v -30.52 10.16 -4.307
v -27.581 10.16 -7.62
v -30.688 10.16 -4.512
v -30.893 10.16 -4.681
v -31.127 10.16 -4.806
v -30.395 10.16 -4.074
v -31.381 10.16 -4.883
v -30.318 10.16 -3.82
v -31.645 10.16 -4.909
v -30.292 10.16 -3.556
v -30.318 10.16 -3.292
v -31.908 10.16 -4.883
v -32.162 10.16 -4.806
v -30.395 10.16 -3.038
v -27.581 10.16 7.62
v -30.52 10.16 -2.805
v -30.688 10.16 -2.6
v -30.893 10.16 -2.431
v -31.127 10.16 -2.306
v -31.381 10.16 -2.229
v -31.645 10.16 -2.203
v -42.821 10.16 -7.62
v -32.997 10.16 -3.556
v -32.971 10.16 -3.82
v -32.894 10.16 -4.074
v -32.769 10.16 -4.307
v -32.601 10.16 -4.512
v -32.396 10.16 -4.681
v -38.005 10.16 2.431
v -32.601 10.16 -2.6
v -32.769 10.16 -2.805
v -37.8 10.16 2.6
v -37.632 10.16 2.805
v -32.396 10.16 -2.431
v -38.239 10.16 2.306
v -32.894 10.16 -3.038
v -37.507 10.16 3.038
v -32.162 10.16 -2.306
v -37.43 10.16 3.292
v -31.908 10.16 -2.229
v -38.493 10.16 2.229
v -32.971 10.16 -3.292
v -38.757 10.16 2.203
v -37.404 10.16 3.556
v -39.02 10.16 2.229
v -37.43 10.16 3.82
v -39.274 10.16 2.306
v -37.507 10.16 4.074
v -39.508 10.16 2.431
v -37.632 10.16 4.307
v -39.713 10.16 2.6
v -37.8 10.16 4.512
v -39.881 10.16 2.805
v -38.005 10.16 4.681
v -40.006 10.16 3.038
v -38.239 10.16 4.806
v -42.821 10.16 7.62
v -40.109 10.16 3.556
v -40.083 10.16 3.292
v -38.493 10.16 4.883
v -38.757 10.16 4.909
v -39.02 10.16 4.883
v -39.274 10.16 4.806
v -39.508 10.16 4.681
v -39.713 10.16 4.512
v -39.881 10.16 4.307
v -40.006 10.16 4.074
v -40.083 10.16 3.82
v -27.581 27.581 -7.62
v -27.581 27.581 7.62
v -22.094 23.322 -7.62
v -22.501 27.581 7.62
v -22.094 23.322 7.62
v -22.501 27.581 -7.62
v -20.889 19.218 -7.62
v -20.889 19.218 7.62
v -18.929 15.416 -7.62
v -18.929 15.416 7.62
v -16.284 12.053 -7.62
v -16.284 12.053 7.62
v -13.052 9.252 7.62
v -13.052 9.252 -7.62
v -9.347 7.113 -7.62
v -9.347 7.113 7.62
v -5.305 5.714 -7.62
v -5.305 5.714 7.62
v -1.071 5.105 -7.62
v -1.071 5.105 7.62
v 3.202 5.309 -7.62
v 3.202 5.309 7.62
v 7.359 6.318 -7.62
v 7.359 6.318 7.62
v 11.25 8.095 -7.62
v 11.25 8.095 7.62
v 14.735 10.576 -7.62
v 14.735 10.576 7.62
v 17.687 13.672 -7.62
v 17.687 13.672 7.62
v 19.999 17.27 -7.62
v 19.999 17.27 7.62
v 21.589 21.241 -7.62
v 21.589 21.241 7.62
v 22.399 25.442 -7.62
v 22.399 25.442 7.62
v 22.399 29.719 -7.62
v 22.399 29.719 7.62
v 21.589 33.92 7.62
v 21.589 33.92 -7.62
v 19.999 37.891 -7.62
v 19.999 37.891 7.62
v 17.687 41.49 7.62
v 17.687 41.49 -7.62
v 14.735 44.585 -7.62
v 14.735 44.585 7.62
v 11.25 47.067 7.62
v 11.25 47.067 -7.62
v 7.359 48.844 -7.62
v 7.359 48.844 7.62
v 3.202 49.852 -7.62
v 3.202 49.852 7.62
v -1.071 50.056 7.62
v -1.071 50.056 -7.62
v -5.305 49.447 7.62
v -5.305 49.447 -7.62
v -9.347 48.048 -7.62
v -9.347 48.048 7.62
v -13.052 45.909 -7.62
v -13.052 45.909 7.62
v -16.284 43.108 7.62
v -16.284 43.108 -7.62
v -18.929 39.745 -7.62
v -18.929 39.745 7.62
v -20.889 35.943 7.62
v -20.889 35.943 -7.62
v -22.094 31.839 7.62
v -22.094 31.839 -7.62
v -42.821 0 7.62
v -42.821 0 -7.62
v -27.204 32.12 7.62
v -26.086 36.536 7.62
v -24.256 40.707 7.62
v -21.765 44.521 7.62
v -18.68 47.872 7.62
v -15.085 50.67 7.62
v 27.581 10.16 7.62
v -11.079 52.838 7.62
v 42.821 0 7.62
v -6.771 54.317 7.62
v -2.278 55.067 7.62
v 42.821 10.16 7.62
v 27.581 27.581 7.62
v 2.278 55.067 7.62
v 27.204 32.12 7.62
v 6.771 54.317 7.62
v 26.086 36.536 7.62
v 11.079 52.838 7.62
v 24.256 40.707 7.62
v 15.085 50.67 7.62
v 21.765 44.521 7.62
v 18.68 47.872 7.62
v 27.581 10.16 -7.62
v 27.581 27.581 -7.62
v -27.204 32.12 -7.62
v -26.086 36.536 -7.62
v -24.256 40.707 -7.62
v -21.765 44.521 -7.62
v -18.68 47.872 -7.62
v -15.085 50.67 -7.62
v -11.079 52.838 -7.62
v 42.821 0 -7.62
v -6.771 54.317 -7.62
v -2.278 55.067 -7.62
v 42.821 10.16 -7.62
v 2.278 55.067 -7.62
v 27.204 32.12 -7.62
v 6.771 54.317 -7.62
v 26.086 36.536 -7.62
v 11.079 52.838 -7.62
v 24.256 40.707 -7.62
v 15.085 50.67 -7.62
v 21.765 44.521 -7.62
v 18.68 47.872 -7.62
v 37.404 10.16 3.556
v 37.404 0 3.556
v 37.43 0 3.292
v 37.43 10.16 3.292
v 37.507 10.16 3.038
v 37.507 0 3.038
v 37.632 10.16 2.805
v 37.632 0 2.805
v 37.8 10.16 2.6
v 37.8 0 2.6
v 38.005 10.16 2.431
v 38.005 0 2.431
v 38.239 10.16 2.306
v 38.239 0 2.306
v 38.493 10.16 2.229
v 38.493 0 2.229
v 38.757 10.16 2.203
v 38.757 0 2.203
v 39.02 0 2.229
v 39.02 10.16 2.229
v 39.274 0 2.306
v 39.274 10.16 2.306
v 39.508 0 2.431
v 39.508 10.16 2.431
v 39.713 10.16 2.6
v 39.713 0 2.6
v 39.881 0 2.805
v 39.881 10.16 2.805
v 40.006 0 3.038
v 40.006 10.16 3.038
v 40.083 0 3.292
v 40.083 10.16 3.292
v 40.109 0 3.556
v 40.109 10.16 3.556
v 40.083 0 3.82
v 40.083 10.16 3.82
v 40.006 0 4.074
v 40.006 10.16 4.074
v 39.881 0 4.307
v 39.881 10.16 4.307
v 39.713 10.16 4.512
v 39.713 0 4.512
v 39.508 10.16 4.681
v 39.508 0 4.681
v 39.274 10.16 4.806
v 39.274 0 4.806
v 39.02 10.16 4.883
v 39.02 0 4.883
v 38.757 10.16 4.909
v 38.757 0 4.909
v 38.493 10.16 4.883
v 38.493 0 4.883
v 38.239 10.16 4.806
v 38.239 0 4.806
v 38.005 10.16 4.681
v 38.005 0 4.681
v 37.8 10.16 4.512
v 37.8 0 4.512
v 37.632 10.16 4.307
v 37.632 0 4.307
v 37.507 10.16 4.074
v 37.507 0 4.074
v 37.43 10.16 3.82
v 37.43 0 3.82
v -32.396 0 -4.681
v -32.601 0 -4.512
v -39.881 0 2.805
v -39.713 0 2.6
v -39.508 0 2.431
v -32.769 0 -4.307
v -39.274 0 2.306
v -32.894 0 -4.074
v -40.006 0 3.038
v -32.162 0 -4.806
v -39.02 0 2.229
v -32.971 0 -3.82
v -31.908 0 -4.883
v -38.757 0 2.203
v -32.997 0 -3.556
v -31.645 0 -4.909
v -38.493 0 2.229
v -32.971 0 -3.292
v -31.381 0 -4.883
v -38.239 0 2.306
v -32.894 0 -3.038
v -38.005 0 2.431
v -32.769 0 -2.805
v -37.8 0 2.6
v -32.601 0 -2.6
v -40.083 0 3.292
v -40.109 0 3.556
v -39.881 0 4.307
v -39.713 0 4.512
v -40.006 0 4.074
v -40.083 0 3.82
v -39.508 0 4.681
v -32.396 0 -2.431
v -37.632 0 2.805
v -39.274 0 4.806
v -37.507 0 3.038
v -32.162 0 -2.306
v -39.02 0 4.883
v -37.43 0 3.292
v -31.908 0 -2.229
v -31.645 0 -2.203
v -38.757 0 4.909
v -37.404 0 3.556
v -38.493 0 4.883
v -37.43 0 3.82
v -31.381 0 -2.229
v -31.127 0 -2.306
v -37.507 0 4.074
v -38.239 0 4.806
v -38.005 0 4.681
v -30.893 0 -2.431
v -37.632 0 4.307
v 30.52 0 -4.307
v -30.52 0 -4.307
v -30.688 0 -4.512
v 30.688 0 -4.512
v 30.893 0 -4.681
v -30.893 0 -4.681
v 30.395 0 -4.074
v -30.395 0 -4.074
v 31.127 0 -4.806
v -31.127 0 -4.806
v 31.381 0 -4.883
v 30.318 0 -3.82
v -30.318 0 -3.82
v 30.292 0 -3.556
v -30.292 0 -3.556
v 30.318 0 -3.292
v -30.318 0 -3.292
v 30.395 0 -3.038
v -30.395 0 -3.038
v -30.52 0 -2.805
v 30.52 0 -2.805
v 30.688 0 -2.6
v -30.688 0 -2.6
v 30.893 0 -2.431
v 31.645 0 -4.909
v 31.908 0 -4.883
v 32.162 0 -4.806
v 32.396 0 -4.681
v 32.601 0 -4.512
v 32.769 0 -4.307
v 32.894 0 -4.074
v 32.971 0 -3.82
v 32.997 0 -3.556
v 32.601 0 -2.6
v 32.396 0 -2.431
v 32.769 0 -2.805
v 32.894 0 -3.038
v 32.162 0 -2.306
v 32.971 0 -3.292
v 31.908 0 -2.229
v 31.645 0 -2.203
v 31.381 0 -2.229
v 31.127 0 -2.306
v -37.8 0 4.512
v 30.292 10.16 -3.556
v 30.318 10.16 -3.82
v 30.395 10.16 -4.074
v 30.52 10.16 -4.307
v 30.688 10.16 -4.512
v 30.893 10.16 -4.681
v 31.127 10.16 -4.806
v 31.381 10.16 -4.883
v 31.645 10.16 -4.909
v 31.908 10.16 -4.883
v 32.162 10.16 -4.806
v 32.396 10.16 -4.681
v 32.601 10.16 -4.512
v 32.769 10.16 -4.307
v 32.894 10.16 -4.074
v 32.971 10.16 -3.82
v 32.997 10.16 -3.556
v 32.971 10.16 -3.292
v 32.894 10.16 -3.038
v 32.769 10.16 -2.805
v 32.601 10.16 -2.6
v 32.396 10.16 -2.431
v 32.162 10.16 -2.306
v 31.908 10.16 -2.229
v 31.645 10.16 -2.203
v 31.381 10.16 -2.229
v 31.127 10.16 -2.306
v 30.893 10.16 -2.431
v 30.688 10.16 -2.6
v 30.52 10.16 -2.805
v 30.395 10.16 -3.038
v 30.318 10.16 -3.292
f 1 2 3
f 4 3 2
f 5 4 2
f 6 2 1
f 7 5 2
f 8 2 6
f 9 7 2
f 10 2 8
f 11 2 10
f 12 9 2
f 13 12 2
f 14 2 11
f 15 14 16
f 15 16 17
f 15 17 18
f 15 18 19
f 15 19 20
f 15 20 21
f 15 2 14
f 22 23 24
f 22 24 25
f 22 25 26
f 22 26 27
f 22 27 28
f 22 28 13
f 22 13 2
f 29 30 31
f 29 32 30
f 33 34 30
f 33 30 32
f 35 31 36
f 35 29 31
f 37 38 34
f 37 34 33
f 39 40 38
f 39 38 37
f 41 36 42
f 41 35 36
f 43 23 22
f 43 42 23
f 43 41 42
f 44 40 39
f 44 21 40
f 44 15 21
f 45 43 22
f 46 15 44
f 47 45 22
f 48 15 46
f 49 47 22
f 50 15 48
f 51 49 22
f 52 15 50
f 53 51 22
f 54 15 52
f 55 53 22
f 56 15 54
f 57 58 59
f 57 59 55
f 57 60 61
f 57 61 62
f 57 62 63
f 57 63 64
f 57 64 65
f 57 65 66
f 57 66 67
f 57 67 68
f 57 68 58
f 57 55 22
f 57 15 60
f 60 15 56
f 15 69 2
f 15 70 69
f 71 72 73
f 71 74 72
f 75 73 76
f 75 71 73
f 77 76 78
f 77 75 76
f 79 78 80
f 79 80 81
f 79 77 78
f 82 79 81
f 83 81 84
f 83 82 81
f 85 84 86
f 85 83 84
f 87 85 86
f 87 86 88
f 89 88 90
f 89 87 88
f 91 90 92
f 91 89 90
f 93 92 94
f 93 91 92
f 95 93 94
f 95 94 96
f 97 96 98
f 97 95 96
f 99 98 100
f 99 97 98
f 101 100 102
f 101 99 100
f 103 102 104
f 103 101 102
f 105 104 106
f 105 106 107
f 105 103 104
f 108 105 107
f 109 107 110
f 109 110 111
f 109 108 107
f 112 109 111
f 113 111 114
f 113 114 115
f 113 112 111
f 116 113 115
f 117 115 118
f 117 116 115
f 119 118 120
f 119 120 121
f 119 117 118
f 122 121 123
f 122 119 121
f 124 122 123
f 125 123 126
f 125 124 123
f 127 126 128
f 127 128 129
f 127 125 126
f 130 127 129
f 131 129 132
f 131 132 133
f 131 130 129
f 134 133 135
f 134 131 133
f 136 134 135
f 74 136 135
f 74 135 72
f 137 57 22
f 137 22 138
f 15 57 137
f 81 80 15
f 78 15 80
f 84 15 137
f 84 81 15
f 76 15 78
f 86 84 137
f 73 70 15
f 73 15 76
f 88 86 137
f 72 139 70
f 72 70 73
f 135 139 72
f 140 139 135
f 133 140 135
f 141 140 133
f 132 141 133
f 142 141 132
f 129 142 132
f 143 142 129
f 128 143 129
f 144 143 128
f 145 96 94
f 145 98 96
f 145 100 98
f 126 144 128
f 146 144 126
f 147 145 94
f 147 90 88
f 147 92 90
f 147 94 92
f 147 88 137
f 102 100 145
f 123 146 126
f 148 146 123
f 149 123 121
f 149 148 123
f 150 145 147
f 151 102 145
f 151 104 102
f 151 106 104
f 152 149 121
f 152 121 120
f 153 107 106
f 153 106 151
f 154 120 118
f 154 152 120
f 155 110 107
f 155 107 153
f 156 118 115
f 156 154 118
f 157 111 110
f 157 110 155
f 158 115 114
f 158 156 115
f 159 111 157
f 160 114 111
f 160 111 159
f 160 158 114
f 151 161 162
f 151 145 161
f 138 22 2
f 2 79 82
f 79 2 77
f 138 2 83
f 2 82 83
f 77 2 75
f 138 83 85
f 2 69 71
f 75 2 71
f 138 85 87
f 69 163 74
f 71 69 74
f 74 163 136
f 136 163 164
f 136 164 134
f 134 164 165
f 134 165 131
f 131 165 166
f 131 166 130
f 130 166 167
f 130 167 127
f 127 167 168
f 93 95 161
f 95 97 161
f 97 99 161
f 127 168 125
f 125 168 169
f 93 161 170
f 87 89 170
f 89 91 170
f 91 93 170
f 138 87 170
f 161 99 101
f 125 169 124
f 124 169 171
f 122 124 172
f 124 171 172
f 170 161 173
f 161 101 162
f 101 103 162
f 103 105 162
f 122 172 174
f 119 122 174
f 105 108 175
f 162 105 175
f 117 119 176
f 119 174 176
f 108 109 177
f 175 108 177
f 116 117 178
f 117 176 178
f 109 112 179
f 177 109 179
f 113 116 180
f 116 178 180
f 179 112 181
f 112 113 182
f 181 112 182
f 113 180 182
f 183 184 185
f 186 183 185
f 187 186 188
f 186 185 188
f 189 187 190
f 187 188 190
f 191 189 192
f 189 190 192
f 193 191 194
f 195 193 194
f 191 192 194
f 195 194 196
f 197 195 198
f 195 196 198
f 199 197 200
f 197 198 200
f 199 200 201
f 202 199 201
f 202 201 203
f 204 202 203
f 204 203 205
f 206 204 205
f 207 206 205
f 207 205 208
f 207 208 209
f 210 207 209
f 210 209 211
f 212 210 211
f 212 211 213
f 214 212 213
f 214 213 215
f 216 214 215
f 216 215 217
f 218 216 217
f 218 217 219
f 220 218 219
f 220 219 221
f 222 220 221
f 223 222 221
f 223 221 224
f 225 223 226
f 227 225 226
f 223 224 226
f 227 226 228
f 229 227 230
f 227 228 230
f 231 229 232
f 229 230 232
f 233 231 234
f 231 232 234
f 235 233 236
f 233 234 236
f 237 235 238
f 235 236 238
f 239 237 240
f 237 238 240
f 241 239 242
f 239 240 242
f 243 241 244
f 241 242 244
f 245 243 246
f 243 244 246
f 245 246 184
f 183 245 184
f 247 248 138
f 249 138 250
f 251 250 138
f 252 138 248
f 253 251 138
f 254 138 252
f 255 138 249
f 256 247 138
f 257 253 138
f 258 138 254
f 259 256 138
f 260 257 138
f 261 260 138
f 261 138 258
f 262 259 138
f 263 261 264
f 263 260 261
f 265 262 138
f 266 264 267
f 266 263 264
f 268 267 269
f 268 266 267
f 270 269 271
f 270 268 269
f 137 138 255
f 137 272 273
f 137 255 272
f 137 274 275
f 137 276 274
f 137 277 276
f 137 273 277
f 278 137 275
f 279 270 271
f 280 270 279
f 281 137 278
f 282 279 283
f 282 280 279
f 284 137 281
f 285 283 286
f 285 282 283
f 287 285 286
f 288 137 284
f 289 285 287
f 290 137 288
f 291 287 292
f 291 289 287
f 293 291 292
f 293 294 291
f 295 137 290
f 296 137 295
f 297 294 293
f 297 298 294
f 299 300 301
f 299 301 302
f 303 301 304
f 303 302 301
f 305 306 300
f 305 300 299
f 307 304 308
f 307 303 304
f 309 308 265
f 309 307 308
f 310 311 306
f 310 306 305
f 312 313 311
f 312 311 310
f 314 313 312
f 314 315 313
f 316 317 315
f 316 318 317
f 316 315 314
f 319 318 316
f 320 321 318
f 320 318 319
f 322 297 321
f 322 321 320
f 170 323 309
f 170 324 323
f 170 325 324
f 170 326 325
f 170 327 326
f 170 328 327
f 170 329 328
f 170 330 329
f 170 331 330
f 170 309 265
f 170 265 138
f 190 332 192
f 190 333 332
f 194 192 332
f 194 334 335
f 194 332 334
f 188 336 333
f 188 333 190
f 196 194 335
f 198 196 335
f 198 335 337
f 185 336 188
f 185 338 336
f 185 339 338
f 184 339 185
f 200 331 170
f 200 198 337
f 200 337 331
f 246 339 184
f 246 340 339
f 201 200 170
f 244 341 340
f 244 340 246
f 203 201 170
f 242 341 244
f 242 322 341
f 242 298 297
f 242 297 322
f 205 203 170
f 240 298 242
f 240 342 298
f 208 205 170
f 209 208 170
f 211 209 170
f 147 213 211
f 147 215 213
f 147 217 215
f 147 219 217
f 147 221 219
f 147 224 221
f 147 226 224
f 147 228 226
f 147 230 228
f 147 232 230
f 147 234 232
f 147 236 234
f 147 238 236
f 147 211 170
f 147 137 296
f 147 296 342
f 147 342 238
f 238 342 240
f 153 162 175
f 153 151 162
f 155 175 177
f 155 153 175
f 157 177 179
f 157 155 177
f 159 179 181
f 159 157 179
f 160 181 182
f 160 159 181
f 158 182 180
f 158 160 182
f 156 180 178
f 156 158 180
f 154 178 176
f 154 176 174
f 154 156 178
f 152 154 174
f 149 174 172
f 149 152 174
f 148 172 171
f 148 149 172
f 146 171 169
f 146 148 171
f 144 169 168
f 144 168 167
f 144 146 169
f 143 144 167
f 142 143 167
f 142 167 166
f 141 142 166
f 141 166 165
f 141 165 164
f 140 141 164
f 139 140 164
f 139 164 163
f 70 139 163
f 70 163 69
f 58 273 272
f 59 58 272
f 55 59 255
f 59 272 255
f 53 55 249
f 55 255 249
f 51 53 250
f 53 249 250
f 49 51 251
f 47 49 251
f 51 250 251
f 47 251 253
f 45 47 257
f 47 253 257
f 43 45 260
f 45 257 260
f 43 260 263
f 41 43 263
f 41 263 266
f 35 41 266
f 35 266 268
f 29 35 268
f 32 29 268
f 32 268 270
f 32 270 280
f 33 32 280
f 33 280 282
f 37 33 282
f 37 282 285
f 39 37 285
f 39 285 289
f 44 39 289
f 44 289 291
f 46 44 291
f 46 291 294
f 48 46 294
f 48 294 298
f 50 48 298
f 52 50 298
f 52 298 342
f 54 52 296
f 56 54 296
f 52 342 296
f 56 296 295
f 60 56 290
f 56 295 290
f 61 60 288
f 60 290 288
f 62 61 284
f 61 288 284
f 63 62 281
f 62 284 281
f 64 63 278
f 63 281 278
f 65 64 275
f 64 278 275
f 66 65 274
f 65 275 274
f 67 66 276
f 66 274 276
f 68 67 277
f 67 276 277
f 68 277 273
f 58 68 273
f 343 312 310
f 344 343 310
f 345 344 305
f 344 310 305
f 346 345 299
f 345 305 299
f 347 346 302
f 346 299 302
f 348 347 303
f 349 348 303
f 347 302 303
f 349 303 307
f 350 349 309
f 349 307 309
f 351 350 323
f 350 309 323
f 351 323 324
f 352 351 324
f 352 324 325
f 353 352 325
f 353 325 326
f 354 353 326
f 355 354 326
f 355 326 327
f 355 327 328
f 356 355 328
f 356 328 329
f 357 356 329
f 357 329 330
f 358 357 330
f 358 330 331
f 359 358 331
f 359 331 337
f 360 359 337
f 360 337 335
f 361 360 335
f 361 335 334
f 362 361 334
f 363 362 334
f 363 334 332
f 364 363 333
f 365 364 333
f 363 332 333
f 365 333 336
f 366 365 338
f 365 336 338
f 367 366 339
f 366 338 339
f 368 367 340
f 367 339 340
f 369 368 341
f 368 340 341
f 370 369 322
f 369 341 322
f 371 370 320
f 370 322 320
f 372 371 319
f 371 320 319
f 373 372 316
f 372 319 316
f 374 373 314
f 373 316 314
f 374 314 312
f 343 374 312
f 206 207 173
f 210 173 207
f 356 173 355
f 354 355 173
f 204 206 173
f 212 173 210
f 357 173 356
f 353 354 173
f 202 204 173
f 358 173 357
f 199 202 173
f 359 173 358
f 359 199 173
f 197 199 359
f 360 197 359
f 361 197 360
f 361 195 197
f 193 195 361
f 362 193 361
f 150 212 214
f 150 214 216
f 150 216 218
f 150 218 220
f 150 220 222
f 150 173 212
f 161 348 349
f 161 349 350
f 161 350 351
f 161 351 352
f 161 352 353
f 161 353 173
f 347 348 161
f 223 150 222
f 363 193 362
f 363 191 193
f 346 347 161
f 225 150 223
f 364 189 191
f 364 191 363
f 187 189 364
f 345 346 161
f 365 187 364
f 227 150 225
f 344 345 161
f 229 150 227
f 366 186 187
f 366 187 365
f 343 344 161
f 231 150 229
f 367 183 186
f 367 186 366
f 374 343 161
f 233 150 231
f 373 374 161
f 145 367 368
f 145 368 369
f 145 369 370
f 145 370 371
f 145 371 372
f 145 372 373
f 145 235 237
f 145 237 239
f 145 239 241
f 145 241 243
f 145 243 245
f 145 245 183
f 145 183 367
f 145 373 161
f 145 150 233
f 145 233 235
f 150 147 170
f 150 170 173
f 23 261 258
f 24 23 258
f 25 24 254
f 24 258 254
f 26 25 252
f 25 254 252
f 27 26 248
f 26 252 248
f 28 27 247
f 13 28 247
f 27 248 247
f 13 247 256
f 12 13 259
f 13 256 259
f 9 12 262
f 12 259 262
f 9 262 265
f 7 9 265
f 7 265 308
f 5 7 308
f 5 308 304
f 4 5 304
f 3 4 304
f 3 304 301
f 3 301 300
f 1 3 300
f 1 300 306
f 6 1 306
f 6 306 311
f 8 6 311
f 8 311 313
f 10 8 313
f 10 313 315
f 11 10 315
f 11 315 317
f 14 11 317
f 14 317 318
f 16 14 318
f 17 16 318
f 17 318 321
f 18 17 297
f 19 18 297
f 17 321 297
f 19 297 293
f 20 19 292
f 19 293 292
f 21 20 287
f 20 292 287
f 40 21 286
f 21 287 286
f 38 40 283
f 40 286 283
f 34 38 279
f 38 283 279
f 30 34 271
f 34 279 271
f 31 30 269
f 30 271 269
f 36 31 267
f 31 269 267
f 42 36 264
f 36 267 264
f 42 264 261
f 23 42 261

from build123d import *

# Parameters (mm, degrees)
SKETCH2_R                 = 22.50059
BOSS_EXTRUDE1_DEPTH       = 7.62
TAP_DRILL_FOR_6_32_TAP1_D = 2.7051


with BuildPart() as part:
    # Sketch2 → Boss-Extrude1 (new, symmetric)
    with BuildSketch(Plane.XY):
        with BuildLine():
            Line((-27.58059, 27.58059), (-27.58059, 10.16))
            Line((-27.58059, 10.16), (-42.82059, 10.16))
            Line((-42.82059, 10.16), (-42.82059, 0))
            Line((-42.82059, 0), (42.82059, 0))
            Line((42.82059, 0), (42.82059, 10.16))
            Line((42.82059, 10.16), (27.58059, 10.16))
            Line((27.58059, 10.16), (27.58059, 27.58059))
            ThreePointArc((27.58059, 27.58059), (0, 55.16118), (-27.58059, 27.58059))
        make_face()
        with Locations(Location((0, 27.58059, 0), (0, 0, 180))):
            Circle(SKETCH2_R, mode=Mode.SUBTRACT)
    extrude(amount=BOSS_EXTRUDE1_DEPTH, both=True)

    # Tap Drill for #6-32 Tap1 (through all)
    with Locations(Plane(origin=(0, 10.16, 0), x_dir=(1, 0, 0), z_dir=(0, 1, 0))):
        with Locations((-38.75659, -3.556), (-31.64459, 3.556), (31.64459, 3.556), (38.75659, -3.556)):
            Hole(TAP_DRILL_FOR_6_32_TAP1_D / 2)


solid = part.part
